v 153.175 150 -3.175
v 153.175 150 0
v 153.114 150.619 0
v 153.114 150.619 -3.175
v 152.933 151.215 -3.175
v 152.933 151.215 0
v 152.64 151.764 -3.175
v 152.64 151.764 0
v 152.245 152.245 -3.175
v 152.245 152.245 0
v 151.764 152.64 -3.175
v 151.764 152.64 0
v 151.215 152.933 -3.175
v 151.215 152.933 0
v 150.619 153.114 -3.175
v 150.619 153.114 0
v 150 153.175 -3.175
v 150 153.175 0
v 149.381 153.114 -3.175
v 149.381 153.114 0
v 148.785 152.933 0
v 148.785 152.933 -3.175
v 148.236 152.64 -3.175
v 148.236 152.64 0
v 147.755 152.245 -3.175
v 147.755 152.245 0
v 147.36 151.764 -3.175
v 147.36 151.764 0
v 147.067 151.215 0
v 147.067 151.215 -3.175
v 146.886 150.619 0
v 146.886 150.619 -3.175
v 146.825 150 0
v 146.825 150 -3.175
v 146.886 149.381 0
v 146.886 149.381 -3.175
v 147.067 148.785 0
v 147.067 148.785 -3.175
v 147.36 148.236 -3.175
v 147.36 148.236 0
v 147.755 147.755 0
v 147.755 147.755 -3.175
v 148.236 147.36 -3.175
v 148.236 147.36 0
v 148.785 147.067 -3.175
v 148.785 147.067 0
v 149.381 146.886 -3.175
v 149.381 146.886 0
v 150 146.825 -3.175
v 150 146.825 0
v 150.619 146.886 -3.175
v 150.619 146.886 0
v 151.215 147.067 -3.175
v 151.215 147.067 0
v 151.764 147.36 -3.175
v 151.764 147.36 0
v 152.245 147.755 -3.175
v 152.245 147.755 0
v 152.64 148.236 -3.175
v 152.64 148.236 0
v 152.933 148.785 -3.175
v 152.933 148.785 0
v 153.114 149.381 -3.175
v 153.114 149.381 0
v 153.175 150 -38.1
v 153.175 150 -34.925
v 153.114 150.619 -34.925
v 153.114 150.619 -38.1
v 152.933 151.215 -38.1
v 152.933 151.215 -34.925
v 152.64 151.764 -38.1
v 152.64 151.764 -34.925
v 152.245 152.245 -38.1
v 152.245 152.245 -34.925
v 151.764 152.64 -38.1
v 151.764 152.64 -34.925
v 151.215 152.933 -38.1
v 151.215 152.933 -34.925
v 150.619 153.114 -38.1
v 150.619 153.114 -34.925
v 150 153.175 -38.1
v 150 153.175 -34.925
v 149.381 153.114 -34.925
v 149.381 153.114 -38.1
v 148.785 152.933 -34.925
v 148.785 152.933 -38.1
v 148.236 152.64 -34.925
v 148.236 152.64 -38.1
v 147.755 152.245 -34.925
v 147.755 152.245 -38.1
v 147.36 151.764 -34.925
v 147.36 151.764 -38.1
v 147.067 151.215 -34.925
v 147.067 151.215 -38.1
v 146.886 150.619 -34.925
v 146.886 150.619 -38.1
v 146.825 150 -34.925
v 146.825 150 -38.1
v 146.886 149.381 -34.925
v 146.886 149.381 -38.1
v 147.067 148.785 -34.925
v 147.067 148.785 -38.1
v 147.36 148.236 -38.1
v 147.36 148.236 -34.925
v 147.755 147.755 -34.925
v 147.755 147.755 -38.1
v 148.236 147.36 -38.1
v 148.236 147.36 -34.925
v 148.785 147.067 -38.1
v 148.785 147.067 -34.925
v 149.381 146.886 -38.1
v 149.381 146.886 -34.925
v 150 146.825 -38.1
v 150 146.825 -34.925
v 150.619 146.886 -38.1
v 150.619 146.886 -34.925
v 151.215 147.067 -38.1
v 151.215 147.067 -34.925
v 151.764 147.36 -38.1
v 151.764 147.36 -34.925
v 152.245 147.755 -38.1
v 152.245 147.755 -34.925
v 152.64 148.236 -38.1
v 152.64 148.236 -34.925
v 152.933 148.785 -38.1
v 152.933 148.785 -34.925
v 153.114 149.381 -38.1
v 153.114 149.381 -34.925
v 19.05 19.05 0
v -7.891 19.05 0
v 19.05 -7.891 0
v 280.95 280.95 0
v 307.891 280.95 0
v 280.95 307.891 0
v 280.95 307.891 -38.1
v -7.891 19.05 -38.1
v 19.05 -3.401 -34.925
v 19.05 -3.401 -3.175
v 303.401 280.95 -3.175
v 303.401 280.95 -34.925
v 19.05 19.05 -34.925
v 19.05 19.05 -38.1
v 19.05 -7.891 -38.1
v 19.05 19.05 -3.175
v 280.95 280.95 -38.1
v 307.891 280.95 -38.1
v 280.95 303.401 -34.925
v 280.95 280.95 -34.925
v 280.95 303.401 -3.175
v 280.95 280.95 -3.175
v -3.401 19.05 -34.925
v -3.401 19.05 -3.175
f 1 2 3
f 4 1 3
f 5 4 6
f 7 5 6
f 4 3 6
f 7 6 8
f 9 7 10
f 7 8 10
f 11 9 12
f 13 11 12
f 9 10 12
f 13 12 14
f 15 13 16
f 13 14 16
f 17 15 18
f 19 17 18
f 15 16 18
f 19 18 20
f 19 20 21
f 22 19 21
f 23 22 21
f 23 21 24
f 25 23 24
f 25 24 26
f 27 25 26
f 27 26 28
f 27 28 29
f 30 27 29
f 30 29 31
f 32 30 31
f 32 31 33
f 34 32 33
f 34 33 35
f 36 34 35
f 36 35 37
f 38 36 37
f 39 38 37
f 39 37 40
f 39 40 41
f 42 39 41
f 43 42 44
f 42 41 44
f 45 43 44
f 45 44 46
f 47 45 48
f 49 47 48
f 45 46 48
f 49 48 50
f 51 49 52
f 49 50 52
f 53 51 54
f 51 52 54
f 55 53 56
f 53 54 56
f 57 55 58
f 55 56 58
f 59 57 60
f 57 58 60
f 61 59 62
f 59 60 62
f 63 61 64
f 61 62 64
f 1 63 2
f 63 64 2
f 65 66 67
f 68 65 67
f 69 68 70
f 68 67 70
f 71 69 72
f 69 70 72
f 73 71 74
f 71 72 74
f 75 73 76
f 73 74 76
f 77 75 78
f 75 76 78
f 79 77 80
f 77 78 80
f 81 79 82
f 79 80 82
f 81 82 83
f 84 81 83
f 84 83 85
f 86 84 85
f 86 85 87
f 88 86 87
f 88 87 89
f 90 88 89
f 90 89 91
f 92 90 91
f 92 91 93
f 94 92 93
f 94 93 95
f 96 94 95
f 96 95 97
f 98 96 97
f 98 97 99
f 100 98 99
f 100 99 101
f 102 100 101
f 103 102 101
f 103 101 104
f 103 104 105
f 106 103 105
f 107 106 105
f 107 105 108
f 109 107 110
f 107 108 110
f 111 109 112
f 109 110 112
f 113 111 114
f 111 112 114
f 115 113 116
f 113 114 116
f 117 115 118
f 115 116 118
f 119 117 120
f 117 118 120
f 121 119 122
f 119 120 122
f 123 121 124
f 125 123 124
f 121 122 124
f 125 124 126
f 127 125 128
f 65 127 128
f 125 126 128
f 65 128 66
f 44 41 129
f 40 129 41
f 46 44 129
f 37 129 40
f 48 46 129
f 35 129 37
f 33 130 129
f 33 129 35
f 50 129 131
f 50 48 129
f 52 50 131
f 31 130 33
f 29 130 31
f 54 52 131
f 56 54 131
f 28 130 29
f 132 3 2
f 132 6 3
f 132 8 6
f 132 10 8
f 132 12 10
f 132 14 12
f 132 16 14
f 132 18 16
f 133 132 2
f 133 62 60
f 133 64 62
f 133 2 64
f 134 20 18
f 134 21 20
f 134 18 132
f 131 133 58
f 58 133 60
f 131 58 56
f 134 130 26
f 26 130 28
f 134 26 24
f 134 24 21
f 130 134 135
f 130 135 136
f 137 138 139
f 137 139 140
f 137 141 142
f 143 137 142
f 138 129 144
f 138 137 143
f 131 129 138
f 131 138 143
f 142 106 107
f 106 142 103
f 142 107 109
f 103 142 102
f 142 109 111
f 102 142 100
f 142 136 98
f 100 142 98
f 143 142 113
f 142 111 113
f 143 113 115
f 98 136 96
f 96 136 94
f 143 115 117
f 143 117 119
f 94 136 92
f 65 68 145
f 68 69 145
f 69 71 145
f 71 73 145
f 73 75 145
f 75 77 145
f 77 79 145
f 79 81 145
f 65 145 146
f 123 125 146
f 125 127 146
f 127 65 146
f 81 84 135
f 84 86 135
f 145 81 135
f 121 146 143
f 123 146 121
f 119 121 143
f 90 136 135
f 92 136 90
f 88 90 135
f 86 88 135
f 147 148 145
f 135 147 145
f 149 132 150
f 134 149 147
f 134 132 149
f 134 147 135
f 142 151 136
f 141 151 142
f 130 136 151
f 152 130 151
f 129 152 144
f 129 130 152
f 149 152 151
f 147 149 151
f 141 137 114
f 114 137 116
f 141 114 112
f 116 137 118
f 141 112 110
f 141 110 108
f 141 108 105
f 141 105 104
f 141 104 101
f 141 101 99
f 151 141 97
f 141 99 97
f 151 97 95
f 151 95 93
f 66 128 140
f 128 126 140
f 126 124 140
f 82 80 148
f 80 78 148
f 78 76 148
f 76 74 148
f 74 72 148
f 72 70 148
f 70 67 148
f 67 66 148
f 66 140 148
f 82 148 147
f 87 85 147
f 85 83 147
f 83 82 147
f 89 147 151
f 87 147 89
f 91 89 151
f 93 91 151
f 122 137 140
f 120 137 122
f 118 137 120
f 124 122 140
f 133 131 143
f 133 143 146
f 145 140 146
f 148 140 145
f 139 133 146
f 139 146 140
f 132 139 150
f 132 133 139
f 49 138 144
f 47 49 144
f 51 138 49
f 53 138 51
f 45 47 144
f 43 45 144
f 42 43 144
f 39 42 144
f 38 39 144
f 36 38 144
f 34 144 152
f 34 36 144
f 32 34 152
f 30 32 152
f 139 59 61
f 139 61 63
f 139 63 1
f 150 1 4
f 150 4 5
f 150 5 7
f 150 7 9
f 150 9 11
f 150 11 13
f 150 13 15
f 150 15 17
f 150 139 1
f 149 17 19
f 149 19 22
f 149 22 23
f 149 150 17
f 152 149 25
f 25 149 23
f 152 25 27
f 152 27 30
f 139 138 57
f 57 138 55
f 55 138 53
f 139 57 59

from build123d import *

# Parameters (mm, degrees)
SKETCH1_R               = 3.175
BOSS_EXTRUDE1_DEPTH     = 38.1
SKETCH3_W               = 31.75
SKETCH3_H               = 31.75
CUT_EXTRUDE1_DEPTH      = 224.291265993
CUT_EXTRUDE1_DEPTH_BACK = 224.291265993


with BuildPart() as part:
    # Sketch1 → Boss-Extrude1 (new body)
    with BuildSketch(Plane.XY):
        Polygon((19.05, -7.890768363), (307.890768363, 280.95), (280.95, 280.95), (280.95, 307.890768363), (-7.890768363, 19.05), (19.05, 19.05), align=None)
        with Locations((150, 150)):
            Circle(SKETCH1_R, mode=Mode.SUBTRACT)
    extrude(amount=-BOSS_EXTRUDE1_DEPTH)

    # Sketch3 → Cut-Extrude1 (cut, two sides)
    with BuildSketch(Plane(origin=(150, 150, 0), x_dir=(-0.707106781, 0.707106781, 0), z_dir=(-0.707106781, -0.707106781, 0))) as cut_extrude1_sk:
        with Locations((0, 19.05)):
            Rectangle(SKETCH3_W, SKETCH3_H)
    extrude(amount=CUT_EXTRUDE1_DEPTH, mode=Mode.SUBTRACT)
    extrude(cut_extrude1_sk.sketch, amount=-CUT_EXTRUDE1_DEPTH_BACK, mode=Mode.SUBTRACT)


solid = part.part
